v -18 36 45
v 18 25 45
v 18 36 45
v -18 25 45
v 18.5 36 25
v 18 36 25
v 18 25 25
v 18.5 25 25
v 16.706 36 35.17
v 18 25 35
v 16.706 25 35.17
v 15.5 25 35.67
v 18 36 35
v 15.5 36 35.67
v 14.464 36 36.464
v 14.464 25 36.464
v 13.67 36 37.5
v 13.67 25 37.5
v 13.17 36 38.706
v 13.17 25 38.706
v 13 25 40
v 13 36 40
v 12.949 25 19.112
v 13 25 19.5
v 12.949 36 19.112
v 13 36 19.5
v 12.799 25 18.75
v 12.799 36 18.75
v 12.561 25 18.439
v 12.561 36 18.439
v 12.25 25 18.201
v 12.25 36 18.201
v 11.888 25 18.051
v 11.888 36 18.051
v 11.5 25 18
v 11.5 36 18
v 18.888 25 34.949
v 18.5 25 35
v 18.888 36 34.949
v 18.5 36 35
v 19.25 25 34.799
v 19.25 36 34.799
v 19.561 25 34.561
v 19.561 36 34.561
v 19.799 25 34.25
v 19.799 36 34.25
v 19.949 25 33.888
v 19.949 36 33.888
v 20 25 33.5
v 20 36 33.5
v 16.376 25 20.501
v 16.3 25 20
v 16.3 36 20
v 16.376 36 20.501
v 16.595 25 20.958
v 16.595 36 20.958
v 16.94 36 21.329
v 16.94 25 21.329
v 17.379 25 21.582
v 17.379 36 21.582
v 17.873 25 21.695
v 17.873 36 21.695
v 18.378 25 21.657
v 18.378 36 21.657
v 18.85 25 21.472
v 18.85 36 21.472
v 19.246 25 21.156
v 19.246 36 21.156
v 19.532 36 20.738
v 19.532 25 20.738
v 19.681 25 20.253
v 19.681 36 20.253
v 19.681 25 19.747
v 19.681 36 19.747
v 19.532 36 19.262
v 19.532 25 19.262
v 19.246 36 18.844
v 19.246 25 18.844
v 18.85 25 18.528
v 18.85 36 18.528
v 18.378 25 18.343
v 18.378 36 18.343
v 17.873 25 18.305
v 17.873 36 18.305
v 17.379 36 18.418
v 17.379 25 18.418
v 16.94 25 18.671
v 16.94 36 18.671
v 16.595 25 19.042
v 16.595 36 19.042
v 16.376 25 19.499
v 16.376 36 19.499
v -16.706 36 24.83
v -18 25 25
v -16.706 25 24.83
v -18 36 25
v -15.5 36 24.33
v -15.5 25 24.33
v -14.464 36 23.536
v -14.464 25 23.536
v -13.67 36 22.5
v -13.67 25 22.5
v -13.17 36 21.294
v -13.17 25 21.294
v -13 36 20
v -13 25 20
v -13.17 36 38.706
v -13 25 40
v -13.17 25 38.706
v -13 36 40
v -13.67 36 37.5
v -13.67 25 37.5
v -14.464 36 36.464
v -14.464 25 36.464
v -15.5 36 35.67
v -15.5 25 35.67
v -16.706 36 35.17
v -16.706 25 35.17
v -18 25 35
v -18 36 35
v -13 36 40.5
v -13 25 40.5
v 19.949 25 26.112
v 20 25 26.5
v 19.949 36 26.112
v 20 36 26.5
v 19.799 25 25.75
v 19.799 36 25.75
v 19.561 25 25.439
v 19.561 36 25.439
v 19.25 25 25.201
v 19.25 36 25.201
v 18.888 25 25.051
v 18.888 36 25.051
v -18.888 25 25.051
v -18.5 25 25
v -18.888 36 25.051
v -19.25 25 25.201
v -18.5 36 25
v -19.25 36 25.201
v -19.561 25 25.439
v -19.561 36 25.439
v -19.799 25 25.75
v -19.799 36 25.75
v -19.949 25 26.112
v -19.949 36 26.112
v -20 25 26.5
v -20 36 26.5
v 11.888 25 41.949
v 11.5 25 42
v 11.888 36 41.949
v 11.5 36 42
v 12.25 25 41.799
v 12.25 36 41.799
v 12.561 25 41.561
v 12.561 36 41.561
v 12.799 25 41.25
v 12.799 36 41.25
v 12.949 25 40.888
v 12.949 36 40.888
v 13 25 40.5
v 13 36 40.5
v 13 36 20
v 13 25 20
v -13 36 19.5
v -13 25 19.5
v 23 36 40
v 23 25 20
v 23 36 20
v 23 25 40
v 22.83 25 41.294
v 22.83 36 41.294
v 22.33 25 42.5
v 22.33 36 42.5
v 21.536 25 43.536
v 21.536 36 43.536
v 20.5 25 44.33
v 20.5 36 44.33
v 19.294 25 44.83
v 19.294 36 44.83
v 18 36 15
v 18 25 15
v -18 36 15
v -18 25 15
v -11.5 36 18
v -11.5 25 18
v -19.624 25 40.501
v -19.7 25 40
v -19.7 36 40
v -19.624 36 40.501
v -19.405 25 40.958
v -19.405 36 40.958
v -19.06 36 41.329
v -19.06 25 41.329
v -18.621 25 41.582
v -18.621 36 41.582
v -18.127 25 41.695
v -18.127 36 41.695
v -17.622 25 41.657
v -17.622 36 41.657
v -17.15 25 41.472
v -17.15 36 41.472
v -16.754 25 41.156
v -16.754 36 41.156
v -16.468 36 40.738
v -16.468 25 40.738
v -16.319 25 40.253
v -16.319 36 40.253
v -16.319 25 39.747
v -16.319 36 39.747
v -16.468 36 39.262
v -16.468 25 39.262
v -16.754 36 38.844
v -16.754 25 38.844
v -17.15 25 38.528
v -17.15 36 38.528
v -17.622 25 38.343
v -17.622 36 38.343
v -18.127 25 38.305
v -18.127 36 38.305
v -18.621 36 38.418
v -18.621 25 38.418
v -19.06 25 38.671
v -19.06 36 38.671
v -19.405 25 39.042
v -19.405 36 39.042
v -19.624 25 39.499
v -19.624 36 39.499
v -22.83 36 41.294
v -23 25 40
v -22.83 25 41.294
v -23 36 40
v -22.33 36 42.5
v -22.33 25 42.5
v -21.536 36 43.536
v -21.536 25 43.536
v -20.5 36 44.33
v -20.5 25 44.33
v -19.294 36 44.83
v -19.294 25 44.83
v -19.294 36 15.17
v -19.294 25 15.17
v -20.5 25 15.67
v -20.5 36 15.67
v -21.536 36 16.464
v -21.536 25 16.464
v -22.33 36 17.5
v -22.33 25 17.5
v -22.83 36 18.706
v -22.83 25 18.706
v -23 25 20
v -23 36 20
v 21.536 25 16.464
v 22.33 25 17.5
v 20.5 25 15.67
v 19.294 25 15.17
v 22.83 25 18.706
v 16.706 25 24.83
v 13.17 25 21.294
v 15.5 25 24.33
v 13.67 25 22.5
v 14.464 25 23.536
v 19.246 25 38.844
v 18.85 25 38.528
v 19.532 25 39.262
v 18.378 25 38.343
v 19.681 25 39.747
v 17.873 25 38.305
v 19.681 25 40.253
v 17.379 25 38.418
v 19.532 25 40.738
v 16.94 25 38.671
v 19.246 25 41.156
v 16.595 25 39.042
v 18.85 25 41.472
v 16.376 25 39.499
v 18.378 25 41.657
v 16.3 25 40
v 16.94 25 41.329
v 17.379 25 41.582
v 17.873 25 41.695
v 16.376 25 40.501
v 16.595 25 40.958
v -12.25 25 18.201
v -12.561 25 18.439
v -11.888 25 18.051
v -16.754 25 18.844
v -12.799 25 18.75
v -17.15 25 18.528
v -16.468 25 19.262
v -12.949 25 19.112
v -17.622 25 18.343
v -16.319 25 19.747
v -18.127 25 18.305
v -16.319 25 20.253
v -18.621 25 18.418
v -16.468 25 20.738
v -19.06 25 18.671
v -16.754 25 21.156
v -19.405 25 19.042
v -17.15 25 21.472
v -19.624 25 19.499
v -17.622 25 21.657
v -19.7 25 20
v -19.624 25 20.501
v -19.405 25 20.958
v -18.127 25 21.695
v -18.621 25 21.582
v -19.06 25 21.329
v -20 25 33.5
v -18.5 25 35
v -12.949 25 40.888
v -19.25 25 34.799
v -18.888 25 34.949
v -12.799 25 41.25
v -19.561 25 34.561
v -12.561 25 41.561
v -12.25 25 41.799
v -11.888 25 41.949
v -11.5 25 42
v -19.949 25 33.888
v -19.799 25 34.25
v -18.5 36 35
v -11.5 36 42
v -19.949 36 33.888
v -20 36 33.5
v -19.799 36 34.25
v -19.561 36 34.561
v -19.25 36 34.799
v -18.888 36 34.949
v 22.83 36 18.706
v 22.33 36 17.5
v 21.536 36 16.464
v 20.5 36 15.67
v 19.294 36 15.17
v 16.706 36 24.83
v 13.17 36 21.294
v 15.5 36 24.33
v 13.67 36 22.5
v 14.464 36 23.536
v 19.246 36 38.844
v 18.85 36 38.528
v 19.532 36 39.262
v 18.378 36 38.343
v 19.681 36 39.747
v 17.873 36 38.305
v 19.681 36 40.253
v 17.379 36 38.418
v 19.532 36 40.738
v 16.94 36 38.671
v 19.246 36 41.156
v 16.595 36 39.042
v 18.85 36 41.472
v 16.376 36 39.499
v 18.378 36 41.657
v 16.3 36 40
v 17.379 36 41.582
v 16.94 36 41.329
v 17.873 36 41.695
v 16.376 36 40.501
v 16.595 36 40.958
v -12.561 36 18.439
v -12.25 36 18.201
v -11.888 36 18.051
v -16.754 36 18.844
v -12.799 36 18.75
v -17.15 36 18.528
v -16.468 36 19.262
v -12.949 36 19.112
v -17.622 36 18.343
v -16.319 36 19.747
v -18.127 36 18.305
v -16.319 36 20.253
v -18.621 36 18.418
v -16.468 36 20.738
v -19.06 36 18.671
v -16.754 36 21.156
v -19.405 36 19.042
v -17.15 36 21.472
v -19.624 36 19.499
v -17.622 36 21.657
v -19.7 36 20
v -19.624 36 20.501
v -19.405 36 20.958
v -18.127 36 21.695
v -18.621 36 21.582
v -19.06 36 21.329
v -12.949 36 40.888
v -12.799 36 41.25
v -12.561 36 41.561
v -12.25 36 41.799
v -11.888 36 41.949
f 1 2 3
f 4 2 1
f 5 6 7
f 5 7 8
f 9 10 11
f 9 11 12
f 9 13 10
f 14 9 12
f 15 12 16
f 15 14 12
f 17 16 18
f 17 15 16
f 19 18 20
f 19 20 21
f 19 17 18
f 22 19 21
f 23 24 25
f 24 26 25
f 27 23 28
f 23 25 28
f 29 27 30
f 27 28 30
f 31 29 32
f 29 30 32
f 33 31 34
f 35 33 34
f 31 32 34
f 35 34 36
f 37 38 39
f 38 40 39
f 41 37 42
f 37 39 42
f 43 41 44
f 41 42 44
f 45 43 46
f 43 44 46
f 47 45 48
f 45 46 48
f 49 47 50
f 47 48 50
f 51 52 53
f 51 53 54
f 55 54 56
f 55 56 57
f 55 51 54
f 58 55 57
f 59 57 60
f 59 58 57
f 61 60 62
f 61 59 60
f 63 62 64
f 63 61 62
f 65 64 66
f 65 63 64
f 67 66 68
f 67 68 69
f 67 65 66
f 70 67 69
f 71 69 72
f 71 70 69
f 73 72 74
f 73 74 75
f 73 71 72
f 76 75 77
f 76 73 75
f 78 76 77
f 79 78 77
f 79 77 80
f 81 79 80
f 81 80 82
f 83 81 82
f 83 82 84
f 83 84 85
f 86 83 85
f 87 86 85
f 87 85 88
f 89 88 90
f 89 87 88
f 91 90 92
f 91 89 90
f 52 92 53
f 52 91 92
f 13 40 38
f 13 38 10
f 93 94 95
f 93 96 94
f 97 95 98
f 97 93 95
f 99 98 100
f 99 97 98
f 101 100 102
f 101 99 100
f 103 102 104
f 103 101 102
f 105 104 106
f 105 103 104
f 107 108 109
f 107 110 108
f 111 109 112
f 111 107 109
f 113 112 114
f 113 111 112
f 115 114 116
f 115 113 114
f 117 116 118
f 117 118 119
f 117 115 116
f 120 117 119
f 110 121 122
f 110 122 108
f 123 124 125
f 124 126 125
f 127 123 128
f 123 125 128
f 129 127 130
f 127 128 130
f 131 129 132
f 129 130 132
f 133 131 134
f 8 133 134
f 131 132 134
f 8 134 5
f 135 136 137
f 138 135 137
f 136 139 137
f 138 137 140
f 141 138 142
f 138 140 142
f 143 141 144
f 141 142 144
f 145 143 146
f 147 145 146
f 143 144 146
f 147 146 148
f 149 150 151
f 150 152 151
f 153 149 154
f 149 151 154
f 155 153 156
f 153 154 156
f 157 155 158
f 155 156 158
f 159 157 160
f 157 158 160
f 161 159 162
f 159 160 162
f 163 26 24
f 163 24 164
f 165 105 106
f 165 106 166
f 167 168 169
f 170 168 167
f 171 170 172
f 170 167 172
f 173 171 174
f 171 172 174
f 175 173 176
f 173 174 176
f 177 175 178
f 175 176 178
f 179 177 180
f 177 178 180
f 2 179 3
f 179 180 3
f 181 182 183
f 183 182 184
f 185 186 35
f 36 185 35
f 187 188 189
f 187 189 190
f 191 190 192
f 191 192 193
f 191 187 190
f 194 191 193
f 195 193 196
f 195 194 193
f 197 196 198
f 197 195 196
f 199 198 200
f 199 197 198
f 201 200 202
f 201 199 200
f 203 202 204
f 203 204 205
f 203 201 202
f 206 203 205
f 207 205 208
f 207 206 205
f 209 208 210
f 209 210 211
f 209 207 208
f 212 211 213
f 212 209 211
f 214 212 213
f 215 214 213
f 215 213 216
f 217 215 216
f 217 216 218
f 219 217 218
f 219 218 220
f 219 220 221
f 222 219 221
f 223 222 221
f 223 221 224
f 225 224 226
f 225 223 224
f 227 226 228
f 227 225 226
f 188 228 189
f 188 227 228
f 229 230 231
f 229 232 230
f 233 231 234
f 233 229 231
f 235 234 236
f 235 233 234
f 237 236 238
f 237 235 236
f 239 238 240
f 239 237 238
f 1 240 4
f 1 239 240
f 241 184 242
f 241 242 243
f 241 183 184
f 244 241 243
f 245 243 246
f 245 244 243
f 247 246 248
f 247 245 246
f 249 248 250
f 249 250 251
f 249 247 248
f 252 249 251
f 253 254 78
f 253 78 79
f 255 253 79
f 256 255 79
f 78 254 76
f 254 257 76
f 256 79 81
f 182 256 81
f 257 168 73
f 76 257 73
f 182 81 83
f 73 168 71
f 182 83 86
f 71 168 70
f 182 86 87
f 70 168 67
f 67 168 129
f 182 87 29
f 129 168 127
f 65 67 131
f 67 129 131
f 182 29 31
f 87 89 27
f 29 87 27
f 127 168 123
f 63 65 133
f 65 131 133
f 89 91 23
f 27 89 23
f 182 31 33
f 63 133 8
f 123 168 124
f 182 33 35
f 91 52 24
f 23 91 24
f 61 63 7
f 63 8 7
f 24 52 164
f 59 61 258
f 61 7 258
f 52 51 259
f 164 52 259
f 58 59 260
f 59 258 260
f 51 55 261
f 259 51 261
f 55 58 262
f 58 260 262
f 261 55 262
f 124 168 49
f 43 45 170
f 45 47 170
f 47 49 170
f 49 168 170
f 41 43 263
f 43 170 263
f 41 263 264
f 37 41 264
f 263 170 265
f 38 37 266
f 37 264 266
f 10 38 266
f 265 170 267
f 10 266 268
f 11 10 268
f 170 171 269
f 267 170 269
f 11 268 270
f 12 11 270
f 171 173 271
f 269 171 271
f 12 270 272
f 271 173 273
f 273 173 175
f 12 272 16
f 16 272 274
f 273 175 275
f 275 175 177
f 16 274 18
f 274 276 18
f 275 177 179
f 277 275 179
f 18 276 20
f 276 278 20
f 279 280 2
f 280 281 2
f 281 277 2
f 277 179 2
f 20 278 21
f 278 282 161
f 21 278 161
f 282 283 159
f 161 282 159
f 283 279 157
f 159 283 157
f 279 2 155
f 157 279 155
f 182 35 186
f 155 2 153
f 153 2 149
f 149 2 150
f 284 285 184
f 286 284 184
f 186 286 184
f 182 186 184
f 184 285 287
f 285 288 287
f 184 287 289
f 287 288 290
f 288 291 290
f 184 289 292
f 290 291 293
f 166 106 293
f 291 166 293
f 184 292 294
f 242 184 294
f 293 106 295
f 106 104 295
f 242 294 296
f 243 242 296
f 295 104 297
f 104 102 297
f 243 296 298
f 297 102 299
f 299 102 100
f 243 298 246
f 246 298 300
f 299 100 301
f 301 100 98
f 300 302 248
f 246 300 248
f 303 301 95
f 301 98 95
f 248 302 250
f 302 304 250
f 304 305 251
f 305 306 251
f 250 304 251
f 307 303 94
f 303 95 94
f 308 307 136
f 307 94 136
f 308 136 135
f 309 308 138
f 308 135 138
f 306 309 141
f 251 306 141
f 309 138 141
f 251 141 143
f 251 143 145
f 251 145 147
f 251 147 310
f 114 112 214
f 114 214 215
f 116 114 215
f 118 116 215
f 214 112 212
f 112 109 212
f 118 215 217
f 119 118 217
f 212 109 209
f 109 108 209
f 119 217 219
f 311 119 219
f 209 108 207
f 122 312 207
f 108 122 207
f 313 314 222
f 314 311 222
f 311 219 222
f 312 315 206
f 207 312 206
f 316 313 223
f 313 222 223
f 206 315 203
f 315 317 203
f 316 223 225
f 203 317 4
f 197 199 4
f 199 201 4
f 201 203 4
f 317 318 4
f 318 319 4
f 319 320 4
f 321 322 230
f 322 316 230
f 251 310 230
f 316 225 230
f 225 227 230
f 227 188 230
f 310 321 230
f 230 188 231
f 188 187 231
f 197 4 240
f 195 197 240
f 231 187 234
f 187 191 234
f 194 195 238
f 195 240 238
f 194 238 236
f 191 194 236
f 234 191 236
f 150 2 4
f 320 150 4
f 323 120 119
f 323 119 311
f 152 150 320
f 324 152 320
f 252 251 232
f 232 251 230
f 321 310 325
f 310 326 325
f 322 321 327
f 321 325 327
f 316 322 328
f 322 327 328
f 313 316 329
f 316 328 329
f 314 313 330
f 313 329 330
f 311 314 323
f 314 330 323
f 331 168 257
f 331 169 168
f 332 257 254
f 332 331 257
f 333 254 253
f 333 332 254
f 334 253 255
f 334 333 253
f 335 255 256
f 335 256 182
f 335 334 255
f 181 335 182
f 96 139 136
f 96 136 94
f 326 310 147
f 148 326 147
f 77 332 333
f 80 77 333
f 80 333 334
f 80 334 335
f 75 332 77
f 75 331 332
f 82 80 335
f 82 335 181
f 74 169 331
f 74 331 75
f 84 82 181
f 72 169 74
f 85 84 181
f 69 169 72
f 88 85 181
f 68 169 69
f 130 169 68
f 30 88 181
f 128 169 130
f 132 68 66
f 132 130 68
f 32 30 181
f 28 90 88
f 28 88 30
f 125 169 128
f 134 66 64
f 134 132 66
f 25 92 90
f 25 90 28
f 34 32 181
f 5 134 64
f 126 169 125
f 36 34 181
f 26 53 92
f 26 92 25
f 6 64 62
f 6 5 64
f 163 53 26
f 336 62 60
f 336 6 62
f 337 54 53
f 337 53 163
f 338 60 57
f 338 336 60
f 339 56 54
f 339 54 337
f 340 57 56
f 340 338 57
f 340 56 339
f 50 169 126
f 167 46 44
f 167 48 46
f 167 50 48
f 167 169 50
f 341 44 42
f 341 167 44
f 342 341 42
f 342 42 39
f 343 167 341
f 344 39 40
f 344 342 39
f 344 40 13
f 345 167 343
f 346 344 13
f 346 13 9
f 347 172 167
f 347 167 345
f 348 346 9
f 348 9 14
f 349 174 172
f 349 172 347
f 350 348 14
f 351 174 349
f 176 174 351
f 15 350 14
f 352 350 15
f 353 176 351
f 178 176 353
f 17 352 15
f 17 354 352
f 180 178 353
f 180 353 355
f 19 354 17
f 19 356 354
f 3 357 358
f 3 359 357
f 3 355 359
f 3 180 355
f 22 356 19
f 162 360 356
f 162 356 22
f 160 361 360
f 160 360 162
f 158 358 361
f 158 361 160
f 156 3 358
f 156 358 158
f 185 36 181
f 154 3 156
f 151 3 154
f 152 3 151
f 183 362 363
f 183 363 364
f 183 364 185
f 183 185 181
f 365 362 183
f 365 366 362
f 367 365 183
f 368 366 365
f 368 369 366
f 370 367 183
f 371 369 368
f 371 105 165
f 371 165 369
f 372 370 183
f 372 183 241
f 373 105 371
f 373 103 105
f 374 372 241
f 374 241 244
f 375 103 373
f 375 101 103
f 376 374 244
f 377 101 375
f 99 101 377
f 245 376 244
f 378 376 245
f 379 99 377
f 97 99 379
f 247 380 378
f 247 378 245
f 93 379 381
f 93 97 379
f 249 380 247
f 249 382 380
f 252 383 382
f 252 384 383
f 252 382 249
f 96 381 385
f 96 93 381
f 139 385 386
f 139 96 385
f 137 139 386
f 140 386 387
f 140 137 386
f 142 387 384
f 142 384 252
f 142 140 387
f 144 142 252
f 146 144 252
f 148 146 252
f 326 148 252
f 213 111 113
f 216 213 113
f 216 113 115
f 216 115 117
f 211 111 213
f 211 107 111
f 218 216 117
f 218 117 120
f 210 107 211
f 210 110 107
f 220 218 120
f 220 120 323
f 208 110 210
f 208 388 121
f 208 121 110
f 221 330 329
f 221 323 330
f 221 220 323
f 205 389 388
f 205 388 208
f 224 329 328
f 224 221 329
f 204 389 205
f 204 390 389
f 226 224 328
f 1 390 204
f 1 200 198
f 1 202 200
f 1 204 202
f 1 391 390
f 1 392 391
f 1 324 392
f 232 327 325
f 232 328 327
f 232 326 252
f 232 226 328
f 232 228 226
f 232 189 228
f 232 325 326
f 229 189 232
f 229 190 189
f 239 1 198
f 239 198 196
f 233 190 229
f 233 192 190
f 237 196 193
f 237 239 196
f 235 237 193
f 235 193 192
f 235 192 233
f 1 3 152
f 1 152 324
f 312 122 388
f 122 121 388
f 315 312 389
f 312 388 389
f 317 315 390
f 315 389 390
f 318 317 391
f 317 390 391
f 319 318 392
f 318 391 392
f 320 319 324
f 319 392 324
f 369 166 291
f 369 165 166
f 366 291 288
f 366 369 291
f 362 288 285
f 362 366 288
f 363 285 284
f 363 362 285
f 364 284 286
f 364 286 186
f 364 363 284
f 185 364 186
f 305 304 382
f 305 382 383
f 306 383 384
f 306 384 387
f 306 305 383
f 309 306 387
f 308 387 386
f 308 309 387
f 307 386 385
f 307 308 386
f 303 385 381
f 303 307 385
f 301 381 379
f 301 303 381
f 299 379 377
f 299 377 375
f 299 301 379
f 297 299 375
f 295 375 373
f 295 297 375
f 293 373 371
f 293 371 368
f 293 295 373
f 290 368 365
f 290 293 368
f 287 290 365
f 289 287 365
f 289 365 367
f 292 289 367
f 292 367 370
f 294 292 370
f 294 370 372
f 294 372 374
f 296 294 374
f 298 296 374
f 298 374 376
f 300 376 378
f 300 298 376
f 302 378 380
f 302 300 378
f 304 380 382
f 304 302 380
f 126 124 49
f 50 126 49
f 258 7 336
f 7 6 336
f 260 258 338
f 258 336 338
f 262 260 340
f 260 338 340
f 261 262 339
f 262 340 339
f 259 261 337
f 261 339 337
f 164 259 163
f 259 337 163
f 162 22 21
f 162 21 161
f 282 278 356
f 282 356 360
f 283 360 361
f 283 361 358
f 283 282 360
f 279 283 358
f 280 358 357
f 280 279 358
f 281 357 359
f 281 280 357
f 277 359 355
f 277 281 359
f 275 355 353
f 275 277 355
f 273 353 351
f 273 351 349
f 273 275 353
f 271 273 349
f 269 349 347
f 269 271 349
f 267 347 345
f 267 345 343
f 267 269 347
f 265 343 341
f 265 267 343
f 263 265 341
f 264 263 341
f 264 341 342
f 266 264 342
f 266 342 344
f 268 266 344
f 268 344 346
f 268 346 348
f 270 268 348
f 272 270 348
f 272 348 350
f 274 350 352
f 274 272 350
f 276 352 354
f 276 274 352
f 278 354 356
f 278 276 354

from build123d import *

# Parameters (mm, degrees)
SKETCH006_W = 46
SKETCH006_H = 30
SKETCH006_R = 1.7
PAD_DEPTH   = 11
FILLET_R    = 5
FILLET001_R = 5
FILLET002_R = 5
FILLET003_R = 5
FILLET004_R = 5
FILLET005_R = 5
FILLET006_R = 5
FILLET007_R = 5
FILLET008_R = 1.5
FILLET009_R = 1.5
FILLET010_R = 1.5
FILLET011_R = 1.5
FILLET012_R = 1.5
FILLET013_R = 1.5
FILLET014_R = 1.5
FILLET015_R = 1.5


with BuildPart() as part:
    # Sketch006 → Pad (new body)
    with BuildSketch(Plane(origin=(0, 25, 0), x_dir=(-1, 0, 0), z_dir=(0, 1, 0))):
        with Locations((0, 30)):
            Rectangle(SKETCH006_W, SKETCH006_H)
        with Locations((-18, 20)):
            Circle(SKETCH006_R, mode=Mode.SUBTRACT)
        with Locations((18, 20)):
            Circle(SKETCH006_R, mode=Mode.SUBTRACT)
        with Locations((-18, 40)):
            Circle(SKETCH006_R, mode=Mode.SUBTRACT)
        with Locations((18, 40)):
            Circle(SKETCH006_R, mode=Mode.SUBTRACT)
        Polygon((-13, 35), (-13, 42), (13, 42), (13, 35), (20, 35), (20, 25), (13, 25), (13, 18), (-13, 18), (-13, 25), (-20, 25), (-20, 35), align=None, mode=Mode.SUBTRACT)
    extrude(amount=PAD_DEPTH)

    # Fillet
    fillet_edges = [part.edges().sort_by_distance(p)[0] for p in [
        (23, 30.5, 45),
    ]]
    fillet(fillet_edges, radius=FILLET_R)

    # Fillet001
    fillet001_edges = [part.edges().sort_by_distance(p)[0] for p in [
        (23, 30.5, 15),
    ]]
    fillet(fillet001_edges, radius=FILLET001_R)

    # Fillet002
    fillet002_edges = [part.edges().sort_by_distance(p)[0] for p in [
        (-23, 30.5, 15),
    ]]
    fillet(fillet002_edges, radius=FILLET002_R)

    # Fillet003
    fillet003_edges = [part.edges().sort_by_distance(p)[0] for p in [
        (-23, 30.5, 45),
    ]]
    fillet(fillet003_edges, radius=FILLET003_R)

    # Fillet004
    fillet004_edges = [part.edges().sort_by_distance(p)[0] for p in [
        (13, 30.5, 25),
    ]]
    fillet(fillet004_edges, radius=FILLET004_R)

    # Fillet005
    fillet005_edges = [part.edges().sort_by_distance(p)[0] for p in [
        (13, 30.5, 35),
    ]]
    fillet(fillet005_edges, radius=FILLET005_R)

    # Fillet006
    fillet006_edges = [part.edges().sort_by_distance(p)[0] for p in [
        (-13, 30.5, 35),
    ]]
    fillet(fillet006_edges, radius=FILLET006_R)

    # Fillet007
    fillet007_edges = [part.edges().sort_by_distance(p)[0] for p in [
        (-13, 30.5, 25),
    ]]
    fillet(fillet007_edges, radius=FILLET007_R)

    # Fillet008
    fillet008_edges = [part.edges().sort_by_distance(p)[0] for p in [
        (-13, 30.5, 42),
    ]]
    fillet(fillet008_edges, radius=FILLET008_R)

    # Fillet009
    fillet009_edges = [part.edges().sort_by_distance(p)[0] for p in [
        (13, 30.5, 42),
    ]]
    fillet(fillet009_edges, radius=FILLET009_R)

    # Fillet010
    fillet010_edges = [part.edges().sort_by_distance(p)[0] for p in [
        (20, 30.5, 35),
    ]]
    fillet(fillet010_edges, radius=FILLET010_R)

    # Fillet011
    fillet011_edges = [part.edges().sort_by_distance(p)[0] for p in [
        (20, 30.5, 25),
    ]]
    fillet(fillet011_edges, radius=FILLET011_R)

    # Fillet012
    fillet012_edges = [part.edges().sort_by_distance(p)[0] for p in [
        (13, 30.5, 18),
    ]]
    fillet(fillet012_edges, radius=FILLET012_R)

    # Fillet013
    fillet013_edges = [part.edges().sort_by_distance(p)[0] for p in [
        (-20, 30.5, 35),
    ]]
    fillet(fillet013_edges, radius=FILLET013_R)

    # Fillet014
    fillet014_edges = [part.edges().sort_by_distance(p)[0] for p in [
        (-13, 30.5, 18),
    ]]
    fillet(fillet014_edges, radius=FILLET014_R)

    # Fillet015
    fillet015_edges = [part.edges().sort_by_distance(p)[0] for p in [
        (-20, 30.5, 25),
    ]]
    fillet(fillet015_edges, radius=FILLET015_R)


solid = part.part
